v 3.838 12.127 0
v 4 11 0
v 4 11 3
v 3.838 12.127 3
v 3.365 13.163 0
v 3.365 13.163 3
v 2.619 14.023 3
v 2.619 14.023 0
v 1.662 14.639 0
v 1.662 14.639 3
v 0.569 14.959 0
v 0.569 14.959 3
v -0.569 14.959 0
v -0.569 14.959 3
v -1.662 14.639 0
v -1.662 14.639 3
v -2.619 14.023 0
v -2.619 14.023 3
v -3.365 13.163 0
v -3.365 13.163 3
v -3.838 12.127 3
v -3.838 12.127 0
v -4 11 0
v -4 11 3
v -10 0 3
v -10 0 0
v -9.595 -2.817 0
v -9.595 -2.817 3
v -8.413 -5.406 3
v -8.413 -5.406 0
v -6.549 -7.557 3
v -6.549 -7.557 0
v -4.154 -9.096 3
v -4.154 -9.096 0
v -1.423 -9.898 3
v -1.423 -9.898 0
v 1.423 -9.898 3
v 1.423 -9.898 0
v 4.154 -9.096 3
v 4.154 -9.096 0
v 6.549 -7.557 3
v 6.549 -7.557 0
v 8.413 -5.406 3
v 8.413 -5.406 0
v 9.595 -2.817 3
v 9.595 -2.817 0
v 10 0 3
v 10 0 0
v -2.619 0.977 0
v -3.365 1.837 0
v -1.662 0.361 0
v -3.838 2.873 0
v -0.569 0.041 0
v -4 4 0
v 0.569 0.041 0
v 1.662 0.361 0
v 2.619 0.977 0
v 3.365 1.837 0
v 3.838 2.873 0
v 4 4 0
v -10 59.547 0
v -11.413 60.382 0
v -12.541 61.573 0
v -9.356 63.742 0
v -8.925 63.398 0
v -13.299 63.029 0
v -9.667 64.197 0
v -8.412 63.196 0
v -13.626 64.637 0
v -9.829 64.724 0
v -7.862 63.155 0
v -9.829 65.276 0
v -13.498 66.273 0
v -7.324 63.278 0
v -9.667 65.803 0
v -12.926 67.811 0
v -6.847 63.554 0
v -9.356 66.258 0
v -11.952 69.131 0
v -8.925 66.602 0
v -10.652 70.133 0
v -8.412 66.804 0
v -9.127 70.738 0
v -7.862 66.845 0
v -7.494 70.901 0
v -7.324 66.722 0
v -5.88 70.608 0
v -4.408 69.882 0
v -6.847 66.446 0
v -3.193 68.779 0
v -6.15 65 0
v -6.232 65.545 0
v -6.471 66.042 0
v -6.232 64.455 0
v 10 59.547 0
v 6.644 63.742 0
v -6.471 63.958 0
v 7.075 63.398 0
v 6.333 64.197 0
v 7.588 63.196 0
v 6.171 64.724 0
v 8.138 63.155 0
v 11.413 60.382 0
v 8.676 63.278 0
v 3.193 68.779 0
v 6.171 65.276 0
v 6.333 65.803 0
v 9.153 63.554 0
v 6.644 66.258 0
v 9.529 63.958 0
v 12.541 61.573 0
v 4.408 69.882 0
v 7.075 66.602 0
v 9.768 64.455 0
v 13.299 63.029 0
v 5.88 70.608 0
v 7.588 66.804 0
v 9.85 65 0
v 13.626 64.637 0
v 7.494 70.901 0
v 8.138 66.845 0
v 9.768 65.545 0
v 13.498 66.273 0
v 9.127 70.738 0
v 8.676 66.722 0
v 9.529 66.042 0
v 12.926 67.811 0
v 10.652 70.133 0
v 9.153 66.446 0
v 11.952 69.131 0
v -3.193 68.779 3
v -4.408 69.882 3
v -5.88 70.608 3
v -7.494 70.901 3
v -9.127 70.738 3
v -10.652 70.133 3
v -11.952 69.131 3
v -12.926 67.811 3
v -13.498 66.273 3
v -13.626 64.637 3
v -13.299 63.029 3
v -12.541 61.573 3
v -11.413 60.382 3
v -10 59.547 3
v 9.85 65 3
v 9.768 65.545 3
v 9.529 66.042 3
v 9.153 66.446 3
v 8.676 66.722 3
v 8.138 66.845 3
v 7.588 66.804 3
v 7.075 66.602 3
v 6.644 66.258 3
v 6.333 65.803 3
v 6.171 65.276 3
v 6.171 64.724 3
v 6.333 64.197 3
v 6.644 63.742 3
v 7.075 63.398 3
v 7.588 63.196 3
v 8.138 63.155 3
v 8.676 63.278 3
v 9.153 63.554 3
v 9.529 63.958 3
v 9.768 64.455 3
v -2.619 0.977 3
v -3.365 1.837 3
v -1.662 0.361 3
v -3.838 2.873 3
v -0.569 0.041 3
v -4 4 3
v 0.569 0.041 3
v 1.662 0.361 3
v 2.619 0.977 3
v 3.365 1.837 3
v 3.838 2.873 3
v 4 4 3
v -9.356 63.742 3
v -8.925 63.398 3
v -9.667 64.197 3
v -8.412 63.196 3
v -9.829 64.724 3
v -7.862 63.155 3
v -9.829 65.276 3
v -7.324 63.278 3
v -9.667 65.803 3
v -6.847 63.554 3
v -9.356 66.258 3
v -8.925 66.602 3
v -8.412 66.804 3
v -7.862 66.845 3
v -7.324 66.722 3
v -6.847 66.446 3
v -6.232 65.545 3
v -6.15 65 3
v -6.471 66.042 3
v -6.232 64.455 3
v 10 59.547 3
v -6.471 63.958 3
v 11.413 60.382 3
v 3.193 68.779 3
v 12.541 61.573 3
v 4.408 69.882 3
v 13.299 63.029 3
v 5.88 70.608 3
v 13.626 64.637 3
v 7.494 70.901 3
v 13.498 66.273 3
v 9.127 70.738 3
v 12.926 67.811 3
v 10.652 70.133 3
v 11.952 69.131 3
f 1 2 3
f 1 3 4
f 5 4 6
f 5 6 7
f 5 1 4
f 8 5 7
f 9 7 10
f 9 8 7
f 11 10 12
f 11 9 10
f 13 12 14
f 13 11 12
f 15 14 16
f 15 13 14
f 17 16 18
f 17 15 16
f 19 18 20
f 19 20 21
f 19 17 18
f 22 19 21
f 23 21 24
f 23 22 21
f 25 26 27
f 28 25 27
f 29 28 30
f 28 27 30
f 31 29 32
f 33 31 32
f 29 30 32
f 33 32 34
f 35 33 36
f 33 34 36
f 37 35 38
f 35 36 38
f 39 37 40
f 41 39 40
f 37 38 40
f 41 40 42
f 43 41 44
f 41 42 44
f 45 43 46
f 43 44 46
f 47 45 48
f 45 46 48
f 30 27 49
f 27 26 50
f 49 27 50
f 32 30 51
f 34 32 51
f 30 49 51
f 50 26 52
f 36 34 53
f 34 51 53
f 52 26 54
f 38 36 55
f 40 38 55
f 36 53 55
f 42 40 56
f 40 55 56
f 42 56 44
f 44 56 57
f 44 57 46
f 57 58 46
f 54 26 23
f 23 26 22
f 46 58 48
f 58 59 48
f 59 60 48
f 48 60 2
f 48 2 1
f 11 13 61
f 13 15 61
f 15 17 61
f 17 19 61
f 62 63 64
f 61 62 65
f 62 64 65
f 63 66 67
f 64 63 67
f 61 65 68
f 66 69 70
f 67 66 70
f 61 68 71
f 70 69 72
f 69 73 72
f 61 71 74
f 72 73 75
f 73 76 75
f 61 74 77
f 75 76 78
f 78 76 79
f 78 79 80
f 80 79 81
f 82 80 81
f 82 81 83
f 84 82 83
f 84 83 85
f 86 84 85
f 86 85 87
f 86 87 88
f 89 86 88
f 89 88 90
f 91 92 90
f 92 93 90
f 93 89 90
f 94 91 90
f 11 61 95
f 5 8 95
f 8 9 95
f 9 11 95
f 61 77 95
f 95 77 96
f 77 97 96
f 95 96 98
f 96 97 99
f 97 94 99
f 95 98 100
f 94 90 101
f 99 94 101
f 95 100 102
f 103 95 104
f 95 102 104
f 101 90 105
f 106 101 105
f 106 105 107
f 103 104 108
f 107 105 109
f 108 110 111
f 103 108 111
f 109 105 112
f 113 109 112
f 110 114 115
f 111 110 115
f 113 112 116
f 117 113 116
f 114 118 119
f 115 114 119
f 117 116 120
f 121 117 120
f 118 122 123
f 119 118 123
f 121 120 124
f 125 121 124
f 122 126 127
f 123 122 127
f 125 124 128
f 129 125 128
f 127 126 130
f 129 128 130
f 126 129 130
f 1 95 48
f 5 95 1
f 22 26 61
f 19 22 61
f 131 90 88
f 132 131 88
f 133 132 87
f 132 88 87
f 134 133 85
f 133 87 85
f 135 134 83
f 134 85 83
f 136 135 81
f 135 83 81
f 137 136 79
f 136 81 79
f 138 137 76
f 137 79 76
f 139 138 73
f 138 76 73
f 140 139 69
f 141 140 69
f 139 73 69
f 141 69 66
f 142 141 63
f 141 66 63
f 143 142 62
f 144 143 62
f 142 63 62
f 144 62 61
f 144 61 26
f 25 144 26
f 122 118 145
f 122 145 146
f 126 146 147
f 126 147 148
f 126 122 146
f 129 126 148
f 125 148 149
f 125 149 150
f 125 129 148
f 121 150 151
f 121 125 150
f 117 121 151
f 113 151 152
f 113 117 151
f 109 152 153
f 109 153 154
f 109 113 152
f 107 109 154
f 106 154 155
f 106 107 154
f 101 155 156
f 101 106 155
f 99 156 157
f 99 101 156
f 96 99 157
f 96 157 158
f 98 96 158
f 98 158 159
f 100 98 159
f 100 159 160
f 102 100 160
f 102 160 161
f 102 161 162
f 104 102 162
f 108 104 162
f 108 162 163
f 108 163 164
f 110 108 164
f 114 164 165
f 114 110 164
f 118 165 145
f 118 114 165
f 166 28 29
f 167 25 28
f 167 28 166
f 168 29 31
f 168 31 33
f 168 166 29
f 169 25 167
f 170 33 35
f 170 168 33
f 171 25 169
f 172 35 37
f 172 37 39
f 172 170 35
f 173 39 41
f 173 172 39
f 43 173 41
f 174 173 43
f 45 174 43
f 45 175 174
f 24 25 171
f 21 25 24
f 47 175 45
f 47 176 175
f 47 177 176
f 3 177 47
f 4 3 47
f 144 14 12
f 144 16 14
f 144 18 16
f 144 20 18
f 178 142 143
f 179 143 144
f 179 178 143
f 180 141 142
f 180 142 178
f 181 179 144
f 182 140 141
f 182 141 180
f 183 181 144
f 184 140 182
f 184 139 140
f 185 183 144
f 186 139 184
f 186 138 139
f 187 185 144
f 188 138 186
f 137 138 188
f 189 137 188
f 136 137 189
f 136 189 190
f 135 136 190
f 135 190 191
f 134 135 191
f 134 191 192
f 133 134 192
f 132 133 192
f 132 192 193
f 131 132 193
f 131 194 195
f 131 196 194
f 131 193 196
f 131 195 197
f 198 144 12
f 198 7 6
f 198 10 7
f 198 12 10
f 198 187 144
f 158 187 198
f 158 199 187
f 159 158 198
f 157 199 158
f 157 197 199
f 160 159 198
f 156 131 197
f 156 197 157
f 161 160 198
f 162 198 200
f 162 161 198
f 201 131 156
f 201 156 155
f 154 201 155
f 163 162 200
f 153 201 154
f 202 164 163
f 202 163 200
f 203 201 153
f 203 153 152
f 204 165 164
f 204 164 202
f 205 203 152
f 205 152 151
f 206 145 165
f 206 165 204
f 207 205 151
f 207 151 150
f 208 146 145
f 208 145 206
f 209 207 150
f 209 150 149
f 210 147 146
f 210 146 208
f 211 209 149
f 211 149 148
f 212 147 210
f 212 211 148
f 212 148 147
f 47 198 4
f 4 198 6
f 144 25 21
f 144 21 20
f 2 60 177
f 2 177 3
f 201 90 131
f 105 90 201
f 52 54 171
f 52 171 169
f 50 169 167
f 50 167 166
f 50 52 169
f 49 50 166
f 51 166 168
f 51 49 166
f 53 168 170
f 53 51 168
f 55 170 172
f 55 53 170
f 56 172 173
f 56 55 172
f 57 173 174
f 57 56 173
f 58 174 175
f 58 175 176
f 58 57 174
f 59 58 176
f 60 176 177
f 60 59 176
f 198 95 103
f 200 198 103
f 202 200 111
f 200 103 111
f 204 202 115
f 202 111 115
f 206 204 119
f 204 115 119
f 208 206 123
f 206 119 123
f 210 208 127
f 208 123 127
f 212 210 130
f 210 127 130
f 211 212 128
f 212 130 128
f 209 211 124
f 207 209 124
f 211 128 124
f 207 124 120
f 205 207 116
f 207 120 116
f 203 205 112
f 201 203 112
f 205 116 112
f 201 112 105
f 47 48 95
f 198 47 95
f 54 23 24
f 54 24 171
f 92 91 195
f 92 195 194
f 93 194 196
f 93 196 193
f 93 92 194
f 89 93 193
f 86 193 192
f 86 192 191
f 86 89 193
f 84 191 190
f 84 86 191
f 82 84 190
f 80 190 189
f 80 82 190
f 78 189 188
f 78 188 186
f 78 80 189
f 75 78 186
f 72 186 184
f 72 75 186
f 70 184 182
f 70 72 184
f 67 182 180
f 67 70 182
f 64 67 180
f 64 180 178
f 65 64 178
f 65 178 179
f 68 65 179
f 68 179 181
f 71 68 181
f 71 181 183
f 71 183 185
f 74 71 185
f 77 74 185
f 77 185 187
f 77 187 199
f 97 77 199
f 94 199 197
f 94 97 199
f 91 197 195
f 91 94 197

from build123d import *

# Parameters (mm, degrees)
SKETCH_R  = 1.85
PAD_DEPTH = 3


with BuildPart() as part:
    # Sketch → Pad (new body)
    with BuildSketch(Plane.XY):
        with BuildLine():
            ThreePointArc((-10, 0), (0, -10), (10, 0))
            Line((10, 0), (10, 59.547349))
            ThreePointArc((10, 59.547349), (12.484765, 68.50486), (3.193049, 68.778855))
            Line((-3.193049, 68.778855), (3.193049, 68.778855))
            ThreePointArc((-3.193049, 68.778855), (-12.484765, 68.50486), (-10, 59.547349))
            Line((-10, 59.547349), (-10, 0))
        make_face()
        with Locations((8, 65)):
            Circle(SKETCH_R, mode=Mode.SUBTRACT)
        with Locations((-8, 65)):
            Circle(SKETCH_R, mode=Mode.SUBTRACT)
        with BuildLine():
            ThreePointArc((4, 11), (0, 15), (-4, 11))
            Line((-4, 11), (-4, 4))
            ThreePointArc((-4, 4), (0, 0), (4, 4))
            Line((4, 4), (4, 11))
        make_face(mode=Mode.SUBTRACT)
    extrude(amount=PAD_DEPTH)


solid = part.part
